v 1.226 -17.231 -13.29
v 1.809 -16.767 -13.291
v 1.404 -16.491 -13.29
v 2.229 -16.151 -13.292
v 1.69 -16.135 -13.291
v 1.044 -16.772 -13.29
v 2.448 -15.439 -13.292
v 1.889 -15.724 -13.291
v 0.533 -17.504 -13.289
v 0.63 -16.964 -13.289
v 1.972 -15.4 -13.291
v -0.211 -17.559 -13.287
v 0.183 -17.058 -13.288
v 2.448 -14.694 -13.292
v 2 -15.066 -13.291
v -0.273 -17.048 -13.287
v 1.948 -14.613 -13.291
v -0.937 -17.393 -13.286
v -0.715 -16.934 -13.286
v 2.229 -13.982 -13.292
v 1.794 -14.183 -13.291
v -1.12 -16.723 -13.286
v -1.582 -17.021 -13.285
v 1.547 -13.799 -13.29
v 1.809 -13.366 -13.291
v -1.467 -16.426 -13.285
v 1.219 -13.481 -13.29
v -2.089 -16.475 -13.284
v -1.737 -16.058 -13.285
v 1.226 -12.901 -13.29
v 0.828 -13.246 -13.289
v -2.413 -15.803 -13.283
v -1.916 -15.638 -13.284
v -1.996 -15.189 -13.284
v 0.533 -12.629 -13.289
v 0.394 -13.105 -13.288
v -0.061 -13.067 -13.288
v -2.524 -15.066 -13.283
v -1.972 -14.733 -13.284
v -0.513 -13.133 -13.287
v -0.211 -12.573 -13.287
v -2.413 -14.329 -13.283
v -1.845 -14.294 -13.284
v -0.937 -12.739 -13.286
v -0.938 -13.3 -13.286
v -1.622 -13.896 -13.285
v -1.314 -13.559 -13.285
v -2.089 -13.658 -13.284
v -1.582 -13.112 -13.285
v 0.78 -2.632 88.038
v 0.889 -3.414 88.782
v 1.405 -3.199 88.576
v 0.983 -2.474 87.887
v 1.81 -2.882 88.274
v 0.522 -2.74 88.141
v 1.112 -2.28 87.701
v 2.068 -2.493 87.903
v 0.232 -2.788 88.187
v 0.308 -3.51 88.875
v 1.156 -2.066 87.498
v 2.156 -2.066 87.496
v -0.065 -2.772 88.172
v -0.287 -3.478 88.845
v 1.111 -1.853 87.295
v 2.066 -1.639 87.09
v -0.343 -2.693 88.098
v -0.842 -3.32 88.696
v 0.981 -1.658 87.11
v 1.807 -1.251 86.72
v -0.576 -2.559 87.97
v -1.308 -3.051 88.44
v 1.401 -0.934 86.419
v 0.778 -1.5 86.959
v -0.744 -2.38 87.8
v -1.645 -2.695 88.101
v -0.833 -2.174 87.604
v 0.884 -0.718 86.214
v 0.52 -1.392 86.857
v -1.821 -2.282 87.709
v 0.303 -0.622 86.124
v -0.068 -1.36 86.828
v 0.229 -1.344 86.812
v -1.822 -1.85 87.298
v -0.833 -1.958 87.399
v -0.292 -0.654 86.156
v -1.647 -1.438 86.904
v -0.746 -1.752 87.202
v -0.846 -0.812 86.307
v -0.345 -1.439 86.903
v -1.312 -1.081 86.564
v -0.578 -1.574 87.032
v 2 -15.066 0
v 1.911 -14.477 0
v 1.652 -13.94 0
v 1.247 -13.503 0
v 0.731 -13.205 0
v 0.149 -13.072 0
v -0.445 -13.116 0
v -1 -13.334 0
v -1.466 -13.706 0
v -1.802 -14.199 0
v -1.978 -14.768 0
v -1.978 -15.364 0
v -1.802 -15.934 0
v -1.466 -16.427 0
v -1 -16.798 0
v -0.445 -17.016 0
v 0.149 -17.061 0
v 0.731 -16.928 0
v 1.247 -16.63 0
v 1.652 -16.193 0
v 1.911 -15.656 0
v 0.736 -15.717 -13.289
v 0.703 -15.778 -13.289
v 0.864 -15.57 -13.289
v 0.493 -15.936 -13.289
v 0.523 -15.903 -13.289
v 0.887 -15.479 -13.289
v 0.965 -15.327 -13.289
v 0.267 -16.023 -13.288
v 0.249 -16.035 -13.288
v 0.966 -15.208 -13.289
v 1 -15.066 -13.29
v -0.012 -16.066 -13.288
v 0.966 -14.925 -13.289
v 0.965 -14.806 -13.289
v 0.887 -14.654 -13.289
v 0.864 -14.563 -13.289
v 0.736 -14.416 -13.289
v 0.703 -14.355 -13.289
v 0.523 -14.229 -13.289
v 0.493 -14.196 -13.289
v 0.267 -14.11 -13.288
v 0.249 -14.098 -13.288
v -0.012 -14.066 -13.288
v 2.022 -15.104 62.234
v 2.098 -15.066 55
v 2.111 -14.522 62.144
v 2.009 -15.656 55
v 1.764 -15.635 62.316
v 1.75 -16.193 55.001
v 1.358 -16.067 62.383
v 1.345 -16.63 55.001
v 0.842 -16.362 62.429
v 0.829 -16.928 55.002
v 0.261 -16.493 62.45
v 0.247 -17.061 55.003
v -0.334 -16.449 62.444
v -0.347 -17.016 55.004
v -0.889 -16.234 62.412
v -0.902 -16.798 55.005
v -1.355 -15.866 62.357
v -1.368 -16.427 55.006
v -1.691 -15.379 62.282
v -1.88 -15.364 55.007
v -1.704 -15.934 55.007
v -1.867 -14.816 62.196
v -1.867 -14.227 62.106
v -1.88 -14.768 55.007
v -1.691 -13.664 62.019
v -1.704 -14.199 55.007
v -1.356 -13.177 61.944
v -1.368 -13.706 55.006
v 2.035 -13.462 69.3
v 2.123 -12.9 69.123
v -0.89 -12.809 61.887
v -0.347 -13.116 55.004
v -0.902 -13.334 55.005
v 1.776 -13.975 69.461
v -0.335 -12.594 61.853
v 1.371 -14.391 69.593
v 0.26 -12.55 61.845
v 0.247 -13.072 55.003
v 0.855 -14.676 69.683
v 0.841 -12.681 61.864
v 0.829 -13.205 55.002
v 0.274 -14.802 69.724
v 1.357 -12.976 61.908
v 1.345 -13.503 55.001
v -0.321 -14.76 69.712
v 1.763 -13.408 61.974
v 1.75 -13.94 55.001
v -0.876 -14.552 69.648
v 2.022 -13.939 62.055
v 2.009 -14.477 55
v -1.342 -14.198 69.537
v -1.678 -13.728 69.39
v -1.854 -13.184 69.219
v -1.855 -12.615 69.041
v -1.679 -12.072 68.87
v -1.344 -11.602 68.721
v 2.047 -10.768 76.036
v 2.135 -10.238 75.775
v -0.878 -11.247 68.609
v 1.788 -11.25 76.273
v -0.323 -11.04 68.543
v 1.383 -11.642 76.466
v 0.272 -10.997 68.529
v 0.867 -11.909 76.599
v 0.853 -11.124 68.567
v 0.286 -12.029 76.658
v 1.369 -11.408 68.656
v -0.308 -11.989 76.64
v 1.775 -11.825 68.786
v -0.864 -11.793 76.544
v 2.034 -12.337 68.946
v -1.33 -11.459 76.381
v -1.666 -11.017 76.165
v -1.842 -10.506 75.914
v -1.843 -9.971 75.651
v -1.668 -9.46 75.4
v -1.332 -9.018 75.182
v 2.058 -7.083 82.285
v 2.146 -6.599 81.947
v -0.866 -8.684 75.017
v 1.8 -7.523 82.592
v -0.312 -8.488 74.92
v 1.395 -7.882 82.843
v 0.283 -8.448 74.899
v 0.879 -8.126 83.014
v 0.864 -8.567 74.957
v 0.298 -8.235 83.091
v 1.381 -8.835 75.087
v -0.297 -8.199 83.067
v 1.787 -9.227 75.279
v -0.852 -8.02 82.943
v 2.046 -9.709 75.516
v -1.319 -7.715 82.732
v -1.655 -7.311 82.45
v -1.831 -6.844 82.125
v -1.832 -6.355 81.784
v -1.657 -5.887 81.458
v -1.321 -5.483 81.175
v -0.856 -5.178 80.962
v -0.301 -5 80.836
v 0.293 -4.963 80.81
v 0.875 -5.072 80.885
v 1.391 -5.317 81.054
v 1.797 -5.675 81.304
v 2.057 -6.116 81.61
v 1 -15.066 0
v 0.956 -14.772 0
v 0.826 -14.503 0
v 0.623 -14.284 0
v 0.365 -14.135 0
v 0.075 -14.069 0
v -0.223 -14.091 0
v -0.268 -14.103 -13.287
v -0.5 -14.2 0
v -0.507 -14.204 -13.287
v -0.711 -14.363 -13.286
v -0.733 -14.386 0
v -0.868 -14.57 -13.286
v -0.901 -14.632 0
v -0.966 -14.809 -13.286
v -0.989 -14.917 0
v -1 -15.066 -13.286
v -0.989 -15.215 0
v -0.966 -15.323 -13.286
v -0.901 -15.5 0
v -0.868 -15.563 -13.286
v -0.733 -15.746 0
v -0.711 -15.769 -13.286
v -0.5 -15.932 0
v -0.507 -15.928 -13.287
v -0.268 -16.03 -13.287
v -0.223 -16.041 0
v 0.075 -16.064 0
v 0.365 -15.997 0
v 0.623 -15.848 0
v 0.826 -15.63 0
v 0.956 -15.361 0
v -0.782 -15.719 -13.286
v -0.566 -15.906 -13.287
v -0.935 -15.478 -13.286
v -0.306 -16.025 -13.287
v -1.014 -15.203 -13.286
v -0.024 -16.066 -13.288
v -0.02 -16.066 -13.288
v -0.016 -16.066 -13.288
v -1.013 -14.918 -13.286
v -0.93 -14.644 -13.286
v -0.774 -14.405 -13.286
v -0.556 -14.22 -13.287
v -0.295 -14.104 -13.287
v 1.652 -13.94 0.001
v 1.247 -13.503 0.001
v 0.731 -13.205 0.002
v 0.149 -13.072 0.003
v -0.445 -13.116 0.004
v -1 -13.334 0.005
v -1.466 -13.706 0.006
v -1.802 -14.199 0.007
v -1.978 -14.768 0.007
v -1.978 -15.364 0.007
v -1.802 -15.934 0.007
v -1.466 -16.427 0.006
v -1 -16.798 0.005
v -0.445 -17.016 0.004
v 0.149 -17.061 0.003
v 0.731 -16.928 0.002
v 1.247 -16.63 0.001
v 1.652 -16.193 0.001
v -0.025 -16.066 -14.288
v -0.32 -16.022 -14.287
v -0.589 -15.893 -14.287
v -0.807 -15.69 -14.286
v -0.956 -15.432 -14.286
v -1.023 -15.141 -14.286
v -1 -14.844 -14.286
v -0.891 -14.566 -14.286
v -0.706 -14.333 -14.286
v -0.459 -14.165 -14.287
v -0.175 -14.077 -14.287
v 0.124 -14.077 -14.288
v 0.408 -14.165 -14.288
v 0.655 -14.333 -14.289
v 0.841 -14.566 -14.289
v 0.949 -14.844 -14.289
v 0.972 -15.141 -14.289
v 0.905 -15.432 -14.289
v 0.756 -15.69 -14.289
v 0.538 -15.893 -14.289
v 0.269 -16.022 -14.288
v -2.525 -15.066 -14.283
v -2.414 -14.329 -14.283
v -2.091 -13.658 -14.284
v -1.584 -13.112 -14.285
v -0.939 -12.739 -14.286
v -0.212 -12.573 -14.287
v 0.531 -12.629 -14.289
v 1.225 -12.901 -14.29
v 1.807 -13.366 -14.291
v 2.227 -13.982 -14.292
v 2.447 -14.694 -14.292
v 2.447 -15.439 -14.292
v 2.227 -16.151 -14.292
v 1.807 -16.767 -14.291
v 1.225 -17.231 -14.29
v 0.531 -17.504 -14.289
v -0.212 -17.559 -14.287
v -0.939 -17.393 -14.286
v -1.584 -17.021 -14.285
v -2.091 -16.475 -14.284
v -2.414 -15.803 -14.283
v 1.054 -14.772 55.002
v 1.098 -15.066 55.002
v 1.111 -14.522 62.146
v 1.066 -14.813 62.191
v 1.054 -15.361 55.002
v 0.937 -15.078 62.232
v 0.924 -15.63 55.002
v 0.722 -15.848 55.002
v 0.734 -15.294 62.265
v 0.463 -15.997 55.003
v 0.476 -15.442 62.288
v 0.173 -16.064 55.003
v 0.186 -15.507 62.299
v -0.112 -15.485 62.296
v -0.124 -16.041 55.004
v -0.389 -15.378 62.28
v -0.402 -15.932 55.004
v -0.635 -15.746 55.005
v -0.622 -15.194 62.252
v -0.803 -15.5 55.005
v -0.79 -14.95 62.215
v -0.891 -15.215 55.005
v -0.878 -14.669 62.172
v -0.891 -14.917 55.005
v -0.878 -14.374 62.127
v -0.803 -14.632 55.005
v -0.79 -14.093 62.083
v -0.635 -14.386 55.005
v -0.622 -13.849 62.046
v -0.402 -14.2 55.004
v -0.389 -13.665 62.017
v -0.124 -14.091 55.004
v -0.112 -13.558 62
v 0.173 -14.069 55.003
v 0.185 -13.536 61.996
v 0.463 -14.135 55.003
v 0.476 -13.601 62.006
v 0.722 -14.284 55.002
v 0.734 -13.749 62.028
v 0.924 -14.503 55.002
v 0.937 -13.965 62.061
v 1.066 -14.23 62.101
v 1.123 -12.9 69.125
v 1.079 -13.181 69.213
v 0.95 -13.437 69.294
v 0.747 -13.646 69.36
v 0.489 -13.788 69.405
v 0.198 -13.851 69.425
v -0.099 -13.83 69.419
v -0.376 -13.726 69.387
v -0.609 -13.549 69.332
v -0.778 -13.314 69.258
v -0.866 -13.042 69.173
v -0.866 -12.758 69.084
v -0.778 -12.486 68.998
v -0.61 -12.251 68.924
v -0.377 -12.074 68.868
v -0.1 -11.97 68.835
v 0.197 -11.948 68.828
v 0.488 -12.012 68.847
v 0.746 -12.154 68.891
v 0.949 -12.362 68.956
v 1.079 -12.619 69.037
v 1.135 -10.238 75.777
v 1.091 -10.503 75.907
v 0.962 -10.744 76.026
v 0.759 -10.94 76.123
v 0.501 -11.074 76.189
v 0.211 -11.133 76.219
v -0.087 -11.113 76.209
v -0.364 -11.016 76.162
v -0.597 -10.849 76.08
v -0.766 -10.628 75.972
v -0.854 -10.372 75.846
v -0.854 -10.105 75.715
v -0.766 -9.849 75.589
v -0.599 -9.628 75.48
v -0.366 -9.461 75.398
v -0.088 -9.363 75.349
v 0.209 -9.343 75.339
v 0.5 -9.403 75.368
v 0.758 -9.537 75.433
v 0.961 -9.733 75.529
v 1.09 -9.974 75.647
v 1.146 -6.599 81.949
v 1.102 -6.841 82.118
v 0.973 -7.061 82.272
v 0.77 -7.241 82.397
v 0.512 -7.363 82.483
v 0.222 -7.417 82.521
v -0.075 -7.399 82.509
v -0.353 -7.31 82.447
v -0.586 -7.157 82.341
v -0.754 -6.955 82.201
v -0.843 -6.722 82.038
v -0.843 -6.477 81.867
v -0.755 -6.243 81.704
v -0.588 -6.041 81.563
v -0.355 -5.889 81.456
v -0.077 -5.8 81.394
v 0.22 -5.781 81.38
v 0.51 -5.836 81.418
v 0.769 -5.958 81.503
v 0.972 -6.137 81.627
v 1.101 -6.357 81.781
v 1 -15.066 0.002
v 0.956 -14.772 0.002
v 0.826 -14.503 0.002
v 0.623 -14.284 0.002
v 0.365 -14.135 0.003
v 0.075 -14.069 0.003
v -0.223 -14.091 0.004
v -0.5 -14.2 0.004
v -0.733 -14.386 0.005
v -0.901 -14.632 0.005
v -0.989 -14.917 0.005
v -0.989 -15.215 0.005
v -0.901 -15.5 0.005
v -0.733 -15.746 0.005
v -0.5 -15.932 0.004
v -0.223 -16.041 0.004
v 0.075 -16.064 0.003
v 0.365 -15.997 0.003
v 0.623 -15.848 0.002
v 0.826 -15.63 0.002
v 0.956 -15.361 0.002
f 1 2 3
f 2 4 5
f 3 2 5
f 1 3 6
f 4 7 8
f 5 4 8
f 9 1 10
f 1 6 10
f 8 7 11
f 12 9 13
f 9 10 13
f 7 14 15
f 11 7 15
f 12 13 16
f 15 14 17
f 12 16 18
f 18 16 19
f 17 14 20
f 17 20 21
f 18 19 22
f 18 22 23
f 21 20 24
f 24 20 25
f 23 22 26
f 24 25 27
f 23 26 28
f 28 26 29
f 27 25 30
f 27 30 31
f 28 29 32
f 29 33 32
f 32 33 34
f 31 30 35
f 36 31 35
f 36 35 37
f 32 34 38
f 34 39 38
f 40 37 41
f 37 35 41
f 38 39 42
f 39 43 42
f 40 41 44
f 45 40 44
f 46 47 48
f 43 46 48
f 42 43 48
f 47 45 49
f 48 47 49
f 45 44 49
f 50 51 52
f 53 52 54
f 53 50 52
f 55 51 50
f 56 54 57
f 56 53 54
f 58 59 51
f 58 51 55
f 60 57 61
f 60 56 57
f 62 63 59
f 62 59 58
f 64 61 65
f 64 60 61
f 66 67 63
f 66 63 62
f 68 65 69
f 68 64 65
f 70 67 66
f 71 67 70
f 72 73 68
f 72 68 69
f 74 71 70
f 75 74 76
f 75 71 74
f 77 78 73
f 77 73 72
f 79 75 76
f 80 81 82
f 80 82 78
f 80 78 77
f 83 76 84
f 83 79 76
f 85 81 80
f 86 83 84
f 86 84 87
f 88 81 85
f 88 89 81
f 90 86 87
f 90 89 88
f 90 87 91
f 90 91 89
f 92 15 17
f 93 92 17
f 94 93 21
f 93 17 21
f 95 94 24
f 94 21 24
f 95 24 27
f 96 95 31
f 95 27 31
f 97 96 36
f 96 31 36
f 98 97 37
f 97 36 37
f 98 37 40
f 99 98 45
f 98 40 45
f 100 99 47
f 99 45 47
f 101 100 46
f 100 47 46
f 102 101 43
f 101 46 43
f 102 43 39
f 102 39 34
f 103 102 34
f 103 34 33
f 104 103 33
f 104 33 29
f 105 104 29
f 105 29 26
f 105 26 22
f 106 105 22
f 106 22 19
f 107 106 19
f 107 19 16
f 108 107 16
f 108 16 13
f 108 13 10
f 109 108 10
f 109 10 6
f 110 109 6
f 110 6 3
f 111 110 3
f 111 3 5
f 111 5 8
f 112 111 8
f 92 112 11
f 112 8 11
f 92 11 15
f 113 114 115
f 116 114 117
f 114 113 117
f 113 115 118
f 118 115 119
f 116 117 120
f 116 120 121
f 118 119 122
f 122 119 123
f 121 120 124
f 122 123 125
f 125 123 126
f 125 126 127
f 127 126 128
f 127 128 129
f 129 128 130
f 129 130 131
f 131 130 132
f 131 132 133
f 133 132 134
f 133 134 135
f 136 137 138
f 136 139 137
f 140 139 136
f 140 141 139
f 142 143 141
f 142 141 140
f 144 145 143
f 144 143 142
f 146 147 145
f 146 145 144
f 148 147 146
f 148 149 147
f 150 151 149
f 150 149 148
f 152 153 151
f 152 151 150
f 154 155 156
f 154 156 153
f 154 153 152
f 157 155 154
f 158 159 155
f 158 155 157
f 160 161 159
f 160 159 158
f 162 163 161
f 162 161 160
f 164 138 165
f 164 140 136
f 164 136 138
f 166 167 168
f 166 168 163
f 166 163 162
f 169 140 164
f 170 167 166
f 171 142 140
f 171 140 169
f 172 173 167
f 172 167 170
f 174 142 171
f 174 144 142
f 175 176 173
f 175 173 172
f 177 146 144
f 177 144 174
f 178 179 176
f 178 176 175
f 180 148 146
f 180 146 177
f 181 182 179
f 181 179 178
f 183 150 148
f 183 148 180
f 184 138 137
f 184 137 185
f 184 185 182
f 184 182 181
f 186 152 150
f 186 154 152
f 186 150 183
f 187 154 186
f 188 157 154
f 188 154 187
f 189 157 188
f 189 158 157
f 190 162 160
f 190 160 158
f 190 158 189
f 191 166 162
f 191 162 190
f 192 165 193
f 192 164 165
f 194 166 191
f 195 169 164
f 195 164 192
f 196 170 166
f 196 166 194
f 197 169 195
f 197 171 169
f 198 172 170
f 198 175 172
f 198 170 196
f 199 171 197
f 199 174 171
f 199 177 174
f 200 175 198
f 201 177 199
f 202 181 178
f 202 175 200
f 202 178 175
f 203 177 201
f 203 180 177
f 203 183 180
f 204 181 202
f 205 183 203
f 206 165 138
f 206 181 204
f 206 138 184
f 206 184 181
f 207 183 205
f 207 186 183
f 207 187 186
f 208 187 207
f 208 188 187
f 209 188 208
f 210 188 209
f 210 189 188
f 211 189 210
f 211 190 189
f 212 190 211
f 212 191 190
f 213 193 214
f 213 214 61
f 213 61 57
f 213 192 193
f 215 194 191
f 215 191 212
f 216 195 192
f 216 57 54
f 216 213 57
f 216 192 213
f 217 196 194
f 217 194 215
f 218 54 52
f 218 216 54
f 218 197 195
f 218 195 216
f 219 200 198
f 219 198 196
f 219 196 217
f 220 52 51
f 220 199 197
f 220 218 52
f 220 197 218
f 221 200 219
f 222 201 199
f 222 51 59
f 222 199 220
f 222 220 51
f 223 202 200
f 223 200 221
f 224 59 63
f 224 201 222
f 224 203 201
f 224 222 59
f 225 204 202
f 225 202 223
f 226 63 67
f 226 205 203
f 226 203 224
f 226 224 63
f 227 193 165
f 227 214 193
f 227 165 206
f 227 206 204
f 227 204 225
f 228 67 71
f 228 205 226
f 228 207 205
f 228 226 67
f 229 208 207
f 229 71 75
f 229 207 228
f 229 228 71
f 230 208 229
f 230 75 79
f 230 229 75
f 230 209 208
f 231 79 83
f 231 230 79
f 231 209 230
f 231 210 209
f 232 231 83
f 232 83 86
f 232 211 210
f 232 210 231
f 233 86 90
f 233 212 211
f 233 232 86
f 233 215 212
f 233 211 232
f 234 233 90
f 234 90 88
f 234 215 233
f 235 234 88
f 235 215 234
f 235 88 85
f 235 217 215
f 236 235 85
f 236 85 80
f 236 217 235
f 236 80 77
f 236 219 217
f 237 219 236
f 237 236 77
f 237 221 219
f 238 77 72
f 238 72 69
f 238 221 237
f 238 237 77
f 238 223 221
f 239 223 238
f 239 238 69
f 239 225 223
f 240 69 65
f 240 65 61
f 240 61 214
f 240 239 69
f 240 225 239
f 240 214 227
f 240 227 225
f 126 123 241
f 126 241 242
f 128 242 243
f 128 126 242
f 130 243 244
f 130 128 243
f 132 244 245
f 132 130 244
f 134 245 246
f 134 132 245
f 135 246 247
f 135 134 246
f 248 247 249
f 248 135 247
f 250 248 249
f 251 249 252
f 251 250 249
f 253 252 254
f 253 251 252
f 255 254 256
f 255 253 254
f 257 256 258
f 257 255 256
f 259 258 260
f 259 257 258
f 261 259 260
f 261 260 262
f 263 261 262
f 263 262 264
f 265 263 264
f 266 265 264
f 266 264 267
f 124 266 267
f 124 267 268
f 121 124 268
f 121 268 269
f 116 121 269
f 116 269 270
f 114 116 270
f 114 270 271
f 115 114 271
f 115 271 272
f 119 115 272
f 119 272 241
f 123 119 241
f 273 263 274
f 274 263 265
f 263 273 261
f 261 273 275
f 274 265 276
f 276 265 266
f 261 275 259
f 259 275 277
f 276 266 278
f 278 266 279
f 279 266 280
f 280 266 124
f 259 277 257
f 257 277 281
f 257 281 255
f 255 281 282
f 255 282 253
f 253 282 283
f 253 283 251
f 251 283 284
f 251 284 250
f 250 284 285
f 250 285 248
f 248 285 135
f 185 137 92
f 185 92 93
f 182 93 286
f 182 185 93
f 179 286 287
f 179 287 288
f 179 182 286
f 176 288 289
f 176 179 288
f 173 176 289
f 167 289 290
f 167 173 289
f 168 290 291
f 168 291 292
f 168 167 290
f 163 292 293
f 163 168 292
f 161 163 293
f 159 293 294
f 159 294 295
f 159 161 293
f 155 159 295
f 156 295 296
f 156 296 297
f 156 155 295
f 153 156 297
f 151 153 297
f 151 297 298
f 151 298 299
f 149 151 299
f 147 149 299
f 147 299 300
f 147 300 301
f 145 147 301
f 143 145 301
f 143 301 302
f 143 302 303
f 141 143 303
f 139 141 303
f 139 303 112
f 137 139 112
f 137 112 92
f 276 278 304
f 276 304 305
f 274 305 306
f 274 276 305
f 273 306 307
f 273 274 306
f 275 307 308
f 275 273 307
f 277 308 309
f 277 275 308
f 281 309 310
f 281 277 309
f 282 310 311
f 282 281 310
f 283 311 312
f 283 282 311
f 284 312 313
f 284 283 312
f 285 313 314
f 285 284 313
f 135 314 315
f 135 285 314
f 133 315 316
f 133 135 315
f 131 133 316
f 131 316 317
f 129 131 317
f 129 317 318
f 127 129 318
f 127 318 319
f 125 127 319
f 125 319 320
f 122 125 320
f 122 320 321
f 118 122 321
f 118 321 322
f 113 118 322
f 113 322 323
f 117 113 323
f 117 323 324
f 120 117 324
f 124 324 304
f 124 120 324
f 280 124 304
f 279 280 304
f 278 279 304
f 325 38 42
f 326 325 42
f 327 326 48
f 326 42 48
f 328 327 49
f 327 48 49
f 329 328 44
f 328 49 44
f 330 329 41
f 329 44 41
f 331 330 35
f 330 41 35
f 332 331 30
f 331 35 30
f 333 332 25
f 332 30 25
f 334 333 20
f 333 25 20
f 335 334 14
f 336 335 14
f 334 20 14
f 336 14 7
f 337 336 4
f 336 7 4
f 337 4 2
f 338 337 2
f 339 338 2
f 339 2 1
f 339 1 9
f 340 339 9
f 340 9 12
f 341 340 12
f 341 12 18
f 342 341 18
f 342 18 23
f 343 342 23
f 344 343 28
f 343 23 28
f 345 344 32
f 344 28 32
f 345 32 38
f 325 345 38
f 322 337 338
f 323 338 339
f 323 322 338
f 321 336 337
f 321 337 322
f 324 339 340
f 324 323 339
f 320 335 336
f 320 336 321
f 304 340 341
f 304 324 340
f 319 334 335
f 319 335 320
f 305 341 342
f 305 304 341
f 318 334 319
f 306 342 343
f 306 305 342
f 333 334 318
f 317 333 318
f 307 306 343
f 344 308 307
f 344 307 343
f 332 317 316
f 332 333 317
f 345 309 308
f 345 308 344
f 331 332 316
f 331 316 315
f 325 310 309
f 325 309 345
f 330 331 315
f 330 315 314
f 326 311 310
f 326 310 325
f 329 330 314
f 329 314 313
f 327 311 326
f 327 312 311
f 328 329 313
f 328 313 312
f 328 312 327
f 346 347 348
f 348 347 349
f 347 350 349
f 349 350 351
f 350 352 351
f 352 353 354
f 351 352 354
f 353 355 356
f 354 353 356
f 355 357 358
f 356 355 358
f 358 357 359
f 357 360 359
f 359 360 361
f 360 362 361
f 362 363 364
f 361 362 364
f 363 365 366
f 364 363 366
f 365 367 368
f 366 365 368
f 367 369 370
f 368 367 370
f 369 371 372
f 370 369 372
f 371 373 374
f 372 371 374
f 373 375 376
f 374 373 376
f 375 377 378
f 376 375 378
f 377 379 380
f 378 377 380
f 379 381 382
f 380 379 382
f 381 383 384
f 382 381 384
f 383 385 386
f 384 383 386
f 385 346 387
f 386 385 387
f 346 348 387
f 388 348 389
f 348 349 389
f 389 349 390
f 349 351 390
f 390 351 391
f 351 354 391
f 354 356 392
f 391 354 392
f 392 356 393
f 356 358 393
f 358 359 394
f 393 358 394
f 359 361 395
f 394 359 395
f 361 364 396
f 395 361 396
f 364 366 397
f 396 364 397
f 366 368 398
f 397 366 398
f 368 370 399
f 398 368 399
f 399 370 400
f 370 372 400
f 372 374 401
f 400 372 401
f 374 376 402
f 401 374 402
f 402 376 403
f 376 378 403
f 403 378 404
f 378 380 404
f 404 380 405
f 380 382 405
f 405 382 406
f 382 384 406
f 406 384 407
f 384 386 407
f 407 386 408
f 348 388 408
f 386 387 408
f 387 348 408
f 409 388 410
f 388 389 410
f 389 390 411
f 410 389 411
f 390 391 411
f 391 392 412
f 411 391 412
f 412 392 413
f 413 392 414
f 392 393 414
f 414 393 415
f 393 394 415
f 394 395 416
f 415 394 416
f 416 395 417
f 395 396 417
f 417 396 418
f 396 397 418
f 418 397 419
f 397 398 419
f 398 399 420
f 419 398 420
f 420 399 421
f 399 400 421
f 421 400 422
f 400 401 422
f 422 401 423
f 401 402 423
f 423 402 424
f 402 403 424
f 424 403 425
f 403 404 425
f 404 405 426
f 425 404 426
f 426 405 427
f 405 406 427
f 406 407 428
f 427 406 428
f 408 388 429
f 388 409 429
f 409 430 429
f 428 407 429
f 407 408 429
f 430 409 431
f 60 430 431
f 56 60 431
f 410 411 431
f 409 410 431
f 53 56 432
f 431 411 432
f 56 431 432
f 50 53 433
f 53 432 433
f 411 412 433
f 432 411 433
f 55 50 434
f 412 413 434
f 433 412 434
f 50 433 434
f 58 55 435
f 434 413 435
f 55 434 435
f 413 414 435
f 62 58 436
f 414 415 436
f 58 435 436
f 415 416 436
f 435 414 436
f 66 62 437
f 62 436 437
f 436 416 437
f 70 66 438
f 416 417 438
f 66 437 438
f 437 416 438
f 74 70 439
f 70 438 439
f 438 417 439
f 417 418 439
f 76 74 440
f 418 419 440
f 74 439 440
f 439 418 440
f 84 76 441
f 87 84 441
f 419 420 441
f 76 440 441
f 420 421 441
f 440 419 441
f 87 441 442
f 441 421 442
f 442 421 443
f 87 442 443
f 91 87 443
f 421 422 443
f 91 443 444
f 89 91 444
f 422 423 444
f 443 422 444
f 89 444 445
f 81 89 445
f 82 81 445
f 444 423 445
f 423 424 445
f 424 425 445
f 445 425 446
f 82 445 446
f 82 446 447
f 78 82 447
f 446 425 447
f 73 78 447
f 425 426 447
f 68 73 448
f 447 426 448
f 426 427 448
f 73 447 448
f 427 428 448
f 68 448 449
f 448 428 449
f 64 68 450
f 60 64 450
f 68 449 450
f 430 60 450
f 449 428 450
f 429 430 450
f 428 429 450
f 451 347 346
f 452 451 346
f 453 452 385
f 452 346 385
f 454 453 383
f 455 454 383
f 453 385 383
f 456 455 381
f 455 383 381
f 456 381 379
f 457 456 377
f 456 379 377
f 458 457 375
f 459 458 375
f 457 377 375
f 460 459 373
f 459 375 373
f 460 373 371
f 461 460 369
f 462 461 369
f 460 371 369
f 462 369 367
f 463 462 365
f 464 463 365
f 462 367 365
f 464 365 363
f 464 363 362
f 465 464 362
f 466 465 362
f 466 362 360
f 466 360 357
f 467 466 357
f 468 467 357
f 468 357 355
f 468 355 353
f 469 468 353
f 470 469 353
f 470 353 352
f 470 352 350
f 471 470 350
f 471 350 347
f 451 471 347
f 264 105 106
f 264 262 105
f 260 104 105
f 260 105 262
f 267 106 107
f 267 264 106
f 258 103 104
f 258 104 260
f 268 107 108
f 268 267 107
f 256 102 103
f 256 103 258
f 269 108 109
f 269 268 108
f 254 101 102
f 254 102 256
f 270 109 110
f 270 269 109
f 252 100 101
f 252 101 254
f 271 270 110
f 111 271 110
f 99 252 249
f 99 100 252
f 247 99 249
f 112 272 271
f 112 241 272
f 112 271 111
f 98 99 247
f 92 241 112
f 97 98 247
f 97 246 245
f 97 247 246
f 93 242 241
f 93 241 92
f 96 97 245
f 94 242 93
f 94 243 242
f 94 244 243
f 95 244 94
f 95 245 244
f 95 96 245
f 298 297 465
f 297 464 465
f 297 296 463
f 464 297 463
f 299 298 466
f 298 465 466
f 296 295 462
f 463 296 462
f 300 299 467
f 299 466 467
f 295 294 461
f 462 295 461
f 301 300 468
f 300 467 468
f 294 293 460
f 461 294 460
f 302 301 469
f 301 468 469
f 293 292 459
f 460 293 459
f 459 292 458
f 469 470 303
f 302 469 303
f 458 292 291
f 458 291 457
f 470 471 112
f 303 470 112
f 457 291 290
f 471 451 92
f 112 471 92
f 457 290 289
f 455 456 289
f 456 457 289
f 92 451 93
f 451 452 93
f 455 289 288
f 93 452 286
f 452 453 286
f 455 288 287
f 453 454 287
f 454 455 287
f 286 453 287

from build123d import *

# Parameters (mm, degrees)
EXTRUDE_START         = -13.29129993
EXTRUDE_1_OUTLINE_R   = 2
EXTRUDE_1_OUTLINE_R_2 = 1
EXTRUDE_1_DEPTH       = 13.29129993
EXTRUDE_START_2       = -14
EXTRUDE_1_2_OUTLINE_W = 7
EXTRUDE_1_2_OUTLINE_H = 7
EXTRUDE_1_2_DEPTH     = 0.712285549
SWEEP_1_PROFILE_R     = 2
SWEEP_1_PROFILE_R_2   = 1
SKETCH_48_R           = 2.5
SKETCH_48_R_2         = 0.99999967
EXTRUDE_2_DEPTH       = 1


with BuildPart() as part:
    # 填料-伸長1: read off the stored shape, not the designer's step
    # 填料-伸長1 outline → 填料-伸長1 (new body)
    with BuildSketch(Plane.XY.offset(EXTRUDE_START)):
        with Locations((0, -15.066296733)):
            Circle(EXTRUDE_1_OUTLINE_R)
        with Locations((0, -15.066296733)):
            Circle(EXTRUDE_1_OUTLINE_R_2, mode=Mode.SUBTRACT)
    extrude(amount=EXTRUDE_1_DEPTH)

    # Extrude 1 2 outline → Extrude 1 2 (cut)
    with BuildSketch(Plane(origin=(0, 0, 0), x_dir=(0.9999984119942068, 0, -0.0017821360960043895), z_dir=(0.0017821360960043895, 0, 0.9999984119942068)).offset(EXTRUDE_START_2)):
        with Locations((0.5, -15.5)):
            Rectangle(EXTRUDE_1_2_OUTLINE_W, EXTRUDE_1_2_OUTLINE_H)
    extrude(amount=EXTRUDE_1_2_DEPTH, mode=Mode.SUBTRACT)

    # 草圖48 → 填料-伸長2 (add)
    with BuildSketch(Plane(origin=(-0.023680516, 0, -13.28769335), x_dir=(-0.9999984119942069, 0, 0.001782136096004392), z_dir=(-0.001782136096004392, 0, -0.9999984119942069))):
        with Locations((0, -15.066296733)):
            Circle(SKETCH_48_R)
        with Locations(Location((0, -15.066296733, 0), (0, 0, 270))):
            Circle(SKETCH_48_R_2, mode=Mode.SUBTRACT)
    extrude(amount=EXTRUDE_2_DEPTH)


with BuildPart() as body_2:
    # 掃出-薄件1: sweep along a path in 草圖2
    with BuildLine(Plane(origin=(0, 0, 0), x_dir=(0.001782136096004214, 0, 0.9999984119942069), z_dir=(-0.9999984119942069, 0, 0.001782136096004214))) as sweep_1_path:
        Line((0.003564272, -15.066296733), (55.003564272, -15.066296733))
        ThreePointArc((55.003564272, -15.066296733), (72.503564272, -11.695734296), (87.499717891, -2.066296733))
    # 掃出-薄件1 profile (on start of the path) → 掃出-薄件1 (sweep)
    with BuildSketch(Plane(origin=(6.352e-06, -15.066296733, 0.003564267), x_dir=(0.9999984119942069, 0, -0.001782136096004214), z_dir=(0.001782136096004214, 0, 0.9999984119942069))):
        Circle(SWEEP_1_PROFILE_R)
        Circle(SWEEP_1_PROFILE_R_2, mode=Mode.SUBTRACT)
    sweep(path=sweep_1_path.line)


solid = Compound([part.part, body_2.part])
